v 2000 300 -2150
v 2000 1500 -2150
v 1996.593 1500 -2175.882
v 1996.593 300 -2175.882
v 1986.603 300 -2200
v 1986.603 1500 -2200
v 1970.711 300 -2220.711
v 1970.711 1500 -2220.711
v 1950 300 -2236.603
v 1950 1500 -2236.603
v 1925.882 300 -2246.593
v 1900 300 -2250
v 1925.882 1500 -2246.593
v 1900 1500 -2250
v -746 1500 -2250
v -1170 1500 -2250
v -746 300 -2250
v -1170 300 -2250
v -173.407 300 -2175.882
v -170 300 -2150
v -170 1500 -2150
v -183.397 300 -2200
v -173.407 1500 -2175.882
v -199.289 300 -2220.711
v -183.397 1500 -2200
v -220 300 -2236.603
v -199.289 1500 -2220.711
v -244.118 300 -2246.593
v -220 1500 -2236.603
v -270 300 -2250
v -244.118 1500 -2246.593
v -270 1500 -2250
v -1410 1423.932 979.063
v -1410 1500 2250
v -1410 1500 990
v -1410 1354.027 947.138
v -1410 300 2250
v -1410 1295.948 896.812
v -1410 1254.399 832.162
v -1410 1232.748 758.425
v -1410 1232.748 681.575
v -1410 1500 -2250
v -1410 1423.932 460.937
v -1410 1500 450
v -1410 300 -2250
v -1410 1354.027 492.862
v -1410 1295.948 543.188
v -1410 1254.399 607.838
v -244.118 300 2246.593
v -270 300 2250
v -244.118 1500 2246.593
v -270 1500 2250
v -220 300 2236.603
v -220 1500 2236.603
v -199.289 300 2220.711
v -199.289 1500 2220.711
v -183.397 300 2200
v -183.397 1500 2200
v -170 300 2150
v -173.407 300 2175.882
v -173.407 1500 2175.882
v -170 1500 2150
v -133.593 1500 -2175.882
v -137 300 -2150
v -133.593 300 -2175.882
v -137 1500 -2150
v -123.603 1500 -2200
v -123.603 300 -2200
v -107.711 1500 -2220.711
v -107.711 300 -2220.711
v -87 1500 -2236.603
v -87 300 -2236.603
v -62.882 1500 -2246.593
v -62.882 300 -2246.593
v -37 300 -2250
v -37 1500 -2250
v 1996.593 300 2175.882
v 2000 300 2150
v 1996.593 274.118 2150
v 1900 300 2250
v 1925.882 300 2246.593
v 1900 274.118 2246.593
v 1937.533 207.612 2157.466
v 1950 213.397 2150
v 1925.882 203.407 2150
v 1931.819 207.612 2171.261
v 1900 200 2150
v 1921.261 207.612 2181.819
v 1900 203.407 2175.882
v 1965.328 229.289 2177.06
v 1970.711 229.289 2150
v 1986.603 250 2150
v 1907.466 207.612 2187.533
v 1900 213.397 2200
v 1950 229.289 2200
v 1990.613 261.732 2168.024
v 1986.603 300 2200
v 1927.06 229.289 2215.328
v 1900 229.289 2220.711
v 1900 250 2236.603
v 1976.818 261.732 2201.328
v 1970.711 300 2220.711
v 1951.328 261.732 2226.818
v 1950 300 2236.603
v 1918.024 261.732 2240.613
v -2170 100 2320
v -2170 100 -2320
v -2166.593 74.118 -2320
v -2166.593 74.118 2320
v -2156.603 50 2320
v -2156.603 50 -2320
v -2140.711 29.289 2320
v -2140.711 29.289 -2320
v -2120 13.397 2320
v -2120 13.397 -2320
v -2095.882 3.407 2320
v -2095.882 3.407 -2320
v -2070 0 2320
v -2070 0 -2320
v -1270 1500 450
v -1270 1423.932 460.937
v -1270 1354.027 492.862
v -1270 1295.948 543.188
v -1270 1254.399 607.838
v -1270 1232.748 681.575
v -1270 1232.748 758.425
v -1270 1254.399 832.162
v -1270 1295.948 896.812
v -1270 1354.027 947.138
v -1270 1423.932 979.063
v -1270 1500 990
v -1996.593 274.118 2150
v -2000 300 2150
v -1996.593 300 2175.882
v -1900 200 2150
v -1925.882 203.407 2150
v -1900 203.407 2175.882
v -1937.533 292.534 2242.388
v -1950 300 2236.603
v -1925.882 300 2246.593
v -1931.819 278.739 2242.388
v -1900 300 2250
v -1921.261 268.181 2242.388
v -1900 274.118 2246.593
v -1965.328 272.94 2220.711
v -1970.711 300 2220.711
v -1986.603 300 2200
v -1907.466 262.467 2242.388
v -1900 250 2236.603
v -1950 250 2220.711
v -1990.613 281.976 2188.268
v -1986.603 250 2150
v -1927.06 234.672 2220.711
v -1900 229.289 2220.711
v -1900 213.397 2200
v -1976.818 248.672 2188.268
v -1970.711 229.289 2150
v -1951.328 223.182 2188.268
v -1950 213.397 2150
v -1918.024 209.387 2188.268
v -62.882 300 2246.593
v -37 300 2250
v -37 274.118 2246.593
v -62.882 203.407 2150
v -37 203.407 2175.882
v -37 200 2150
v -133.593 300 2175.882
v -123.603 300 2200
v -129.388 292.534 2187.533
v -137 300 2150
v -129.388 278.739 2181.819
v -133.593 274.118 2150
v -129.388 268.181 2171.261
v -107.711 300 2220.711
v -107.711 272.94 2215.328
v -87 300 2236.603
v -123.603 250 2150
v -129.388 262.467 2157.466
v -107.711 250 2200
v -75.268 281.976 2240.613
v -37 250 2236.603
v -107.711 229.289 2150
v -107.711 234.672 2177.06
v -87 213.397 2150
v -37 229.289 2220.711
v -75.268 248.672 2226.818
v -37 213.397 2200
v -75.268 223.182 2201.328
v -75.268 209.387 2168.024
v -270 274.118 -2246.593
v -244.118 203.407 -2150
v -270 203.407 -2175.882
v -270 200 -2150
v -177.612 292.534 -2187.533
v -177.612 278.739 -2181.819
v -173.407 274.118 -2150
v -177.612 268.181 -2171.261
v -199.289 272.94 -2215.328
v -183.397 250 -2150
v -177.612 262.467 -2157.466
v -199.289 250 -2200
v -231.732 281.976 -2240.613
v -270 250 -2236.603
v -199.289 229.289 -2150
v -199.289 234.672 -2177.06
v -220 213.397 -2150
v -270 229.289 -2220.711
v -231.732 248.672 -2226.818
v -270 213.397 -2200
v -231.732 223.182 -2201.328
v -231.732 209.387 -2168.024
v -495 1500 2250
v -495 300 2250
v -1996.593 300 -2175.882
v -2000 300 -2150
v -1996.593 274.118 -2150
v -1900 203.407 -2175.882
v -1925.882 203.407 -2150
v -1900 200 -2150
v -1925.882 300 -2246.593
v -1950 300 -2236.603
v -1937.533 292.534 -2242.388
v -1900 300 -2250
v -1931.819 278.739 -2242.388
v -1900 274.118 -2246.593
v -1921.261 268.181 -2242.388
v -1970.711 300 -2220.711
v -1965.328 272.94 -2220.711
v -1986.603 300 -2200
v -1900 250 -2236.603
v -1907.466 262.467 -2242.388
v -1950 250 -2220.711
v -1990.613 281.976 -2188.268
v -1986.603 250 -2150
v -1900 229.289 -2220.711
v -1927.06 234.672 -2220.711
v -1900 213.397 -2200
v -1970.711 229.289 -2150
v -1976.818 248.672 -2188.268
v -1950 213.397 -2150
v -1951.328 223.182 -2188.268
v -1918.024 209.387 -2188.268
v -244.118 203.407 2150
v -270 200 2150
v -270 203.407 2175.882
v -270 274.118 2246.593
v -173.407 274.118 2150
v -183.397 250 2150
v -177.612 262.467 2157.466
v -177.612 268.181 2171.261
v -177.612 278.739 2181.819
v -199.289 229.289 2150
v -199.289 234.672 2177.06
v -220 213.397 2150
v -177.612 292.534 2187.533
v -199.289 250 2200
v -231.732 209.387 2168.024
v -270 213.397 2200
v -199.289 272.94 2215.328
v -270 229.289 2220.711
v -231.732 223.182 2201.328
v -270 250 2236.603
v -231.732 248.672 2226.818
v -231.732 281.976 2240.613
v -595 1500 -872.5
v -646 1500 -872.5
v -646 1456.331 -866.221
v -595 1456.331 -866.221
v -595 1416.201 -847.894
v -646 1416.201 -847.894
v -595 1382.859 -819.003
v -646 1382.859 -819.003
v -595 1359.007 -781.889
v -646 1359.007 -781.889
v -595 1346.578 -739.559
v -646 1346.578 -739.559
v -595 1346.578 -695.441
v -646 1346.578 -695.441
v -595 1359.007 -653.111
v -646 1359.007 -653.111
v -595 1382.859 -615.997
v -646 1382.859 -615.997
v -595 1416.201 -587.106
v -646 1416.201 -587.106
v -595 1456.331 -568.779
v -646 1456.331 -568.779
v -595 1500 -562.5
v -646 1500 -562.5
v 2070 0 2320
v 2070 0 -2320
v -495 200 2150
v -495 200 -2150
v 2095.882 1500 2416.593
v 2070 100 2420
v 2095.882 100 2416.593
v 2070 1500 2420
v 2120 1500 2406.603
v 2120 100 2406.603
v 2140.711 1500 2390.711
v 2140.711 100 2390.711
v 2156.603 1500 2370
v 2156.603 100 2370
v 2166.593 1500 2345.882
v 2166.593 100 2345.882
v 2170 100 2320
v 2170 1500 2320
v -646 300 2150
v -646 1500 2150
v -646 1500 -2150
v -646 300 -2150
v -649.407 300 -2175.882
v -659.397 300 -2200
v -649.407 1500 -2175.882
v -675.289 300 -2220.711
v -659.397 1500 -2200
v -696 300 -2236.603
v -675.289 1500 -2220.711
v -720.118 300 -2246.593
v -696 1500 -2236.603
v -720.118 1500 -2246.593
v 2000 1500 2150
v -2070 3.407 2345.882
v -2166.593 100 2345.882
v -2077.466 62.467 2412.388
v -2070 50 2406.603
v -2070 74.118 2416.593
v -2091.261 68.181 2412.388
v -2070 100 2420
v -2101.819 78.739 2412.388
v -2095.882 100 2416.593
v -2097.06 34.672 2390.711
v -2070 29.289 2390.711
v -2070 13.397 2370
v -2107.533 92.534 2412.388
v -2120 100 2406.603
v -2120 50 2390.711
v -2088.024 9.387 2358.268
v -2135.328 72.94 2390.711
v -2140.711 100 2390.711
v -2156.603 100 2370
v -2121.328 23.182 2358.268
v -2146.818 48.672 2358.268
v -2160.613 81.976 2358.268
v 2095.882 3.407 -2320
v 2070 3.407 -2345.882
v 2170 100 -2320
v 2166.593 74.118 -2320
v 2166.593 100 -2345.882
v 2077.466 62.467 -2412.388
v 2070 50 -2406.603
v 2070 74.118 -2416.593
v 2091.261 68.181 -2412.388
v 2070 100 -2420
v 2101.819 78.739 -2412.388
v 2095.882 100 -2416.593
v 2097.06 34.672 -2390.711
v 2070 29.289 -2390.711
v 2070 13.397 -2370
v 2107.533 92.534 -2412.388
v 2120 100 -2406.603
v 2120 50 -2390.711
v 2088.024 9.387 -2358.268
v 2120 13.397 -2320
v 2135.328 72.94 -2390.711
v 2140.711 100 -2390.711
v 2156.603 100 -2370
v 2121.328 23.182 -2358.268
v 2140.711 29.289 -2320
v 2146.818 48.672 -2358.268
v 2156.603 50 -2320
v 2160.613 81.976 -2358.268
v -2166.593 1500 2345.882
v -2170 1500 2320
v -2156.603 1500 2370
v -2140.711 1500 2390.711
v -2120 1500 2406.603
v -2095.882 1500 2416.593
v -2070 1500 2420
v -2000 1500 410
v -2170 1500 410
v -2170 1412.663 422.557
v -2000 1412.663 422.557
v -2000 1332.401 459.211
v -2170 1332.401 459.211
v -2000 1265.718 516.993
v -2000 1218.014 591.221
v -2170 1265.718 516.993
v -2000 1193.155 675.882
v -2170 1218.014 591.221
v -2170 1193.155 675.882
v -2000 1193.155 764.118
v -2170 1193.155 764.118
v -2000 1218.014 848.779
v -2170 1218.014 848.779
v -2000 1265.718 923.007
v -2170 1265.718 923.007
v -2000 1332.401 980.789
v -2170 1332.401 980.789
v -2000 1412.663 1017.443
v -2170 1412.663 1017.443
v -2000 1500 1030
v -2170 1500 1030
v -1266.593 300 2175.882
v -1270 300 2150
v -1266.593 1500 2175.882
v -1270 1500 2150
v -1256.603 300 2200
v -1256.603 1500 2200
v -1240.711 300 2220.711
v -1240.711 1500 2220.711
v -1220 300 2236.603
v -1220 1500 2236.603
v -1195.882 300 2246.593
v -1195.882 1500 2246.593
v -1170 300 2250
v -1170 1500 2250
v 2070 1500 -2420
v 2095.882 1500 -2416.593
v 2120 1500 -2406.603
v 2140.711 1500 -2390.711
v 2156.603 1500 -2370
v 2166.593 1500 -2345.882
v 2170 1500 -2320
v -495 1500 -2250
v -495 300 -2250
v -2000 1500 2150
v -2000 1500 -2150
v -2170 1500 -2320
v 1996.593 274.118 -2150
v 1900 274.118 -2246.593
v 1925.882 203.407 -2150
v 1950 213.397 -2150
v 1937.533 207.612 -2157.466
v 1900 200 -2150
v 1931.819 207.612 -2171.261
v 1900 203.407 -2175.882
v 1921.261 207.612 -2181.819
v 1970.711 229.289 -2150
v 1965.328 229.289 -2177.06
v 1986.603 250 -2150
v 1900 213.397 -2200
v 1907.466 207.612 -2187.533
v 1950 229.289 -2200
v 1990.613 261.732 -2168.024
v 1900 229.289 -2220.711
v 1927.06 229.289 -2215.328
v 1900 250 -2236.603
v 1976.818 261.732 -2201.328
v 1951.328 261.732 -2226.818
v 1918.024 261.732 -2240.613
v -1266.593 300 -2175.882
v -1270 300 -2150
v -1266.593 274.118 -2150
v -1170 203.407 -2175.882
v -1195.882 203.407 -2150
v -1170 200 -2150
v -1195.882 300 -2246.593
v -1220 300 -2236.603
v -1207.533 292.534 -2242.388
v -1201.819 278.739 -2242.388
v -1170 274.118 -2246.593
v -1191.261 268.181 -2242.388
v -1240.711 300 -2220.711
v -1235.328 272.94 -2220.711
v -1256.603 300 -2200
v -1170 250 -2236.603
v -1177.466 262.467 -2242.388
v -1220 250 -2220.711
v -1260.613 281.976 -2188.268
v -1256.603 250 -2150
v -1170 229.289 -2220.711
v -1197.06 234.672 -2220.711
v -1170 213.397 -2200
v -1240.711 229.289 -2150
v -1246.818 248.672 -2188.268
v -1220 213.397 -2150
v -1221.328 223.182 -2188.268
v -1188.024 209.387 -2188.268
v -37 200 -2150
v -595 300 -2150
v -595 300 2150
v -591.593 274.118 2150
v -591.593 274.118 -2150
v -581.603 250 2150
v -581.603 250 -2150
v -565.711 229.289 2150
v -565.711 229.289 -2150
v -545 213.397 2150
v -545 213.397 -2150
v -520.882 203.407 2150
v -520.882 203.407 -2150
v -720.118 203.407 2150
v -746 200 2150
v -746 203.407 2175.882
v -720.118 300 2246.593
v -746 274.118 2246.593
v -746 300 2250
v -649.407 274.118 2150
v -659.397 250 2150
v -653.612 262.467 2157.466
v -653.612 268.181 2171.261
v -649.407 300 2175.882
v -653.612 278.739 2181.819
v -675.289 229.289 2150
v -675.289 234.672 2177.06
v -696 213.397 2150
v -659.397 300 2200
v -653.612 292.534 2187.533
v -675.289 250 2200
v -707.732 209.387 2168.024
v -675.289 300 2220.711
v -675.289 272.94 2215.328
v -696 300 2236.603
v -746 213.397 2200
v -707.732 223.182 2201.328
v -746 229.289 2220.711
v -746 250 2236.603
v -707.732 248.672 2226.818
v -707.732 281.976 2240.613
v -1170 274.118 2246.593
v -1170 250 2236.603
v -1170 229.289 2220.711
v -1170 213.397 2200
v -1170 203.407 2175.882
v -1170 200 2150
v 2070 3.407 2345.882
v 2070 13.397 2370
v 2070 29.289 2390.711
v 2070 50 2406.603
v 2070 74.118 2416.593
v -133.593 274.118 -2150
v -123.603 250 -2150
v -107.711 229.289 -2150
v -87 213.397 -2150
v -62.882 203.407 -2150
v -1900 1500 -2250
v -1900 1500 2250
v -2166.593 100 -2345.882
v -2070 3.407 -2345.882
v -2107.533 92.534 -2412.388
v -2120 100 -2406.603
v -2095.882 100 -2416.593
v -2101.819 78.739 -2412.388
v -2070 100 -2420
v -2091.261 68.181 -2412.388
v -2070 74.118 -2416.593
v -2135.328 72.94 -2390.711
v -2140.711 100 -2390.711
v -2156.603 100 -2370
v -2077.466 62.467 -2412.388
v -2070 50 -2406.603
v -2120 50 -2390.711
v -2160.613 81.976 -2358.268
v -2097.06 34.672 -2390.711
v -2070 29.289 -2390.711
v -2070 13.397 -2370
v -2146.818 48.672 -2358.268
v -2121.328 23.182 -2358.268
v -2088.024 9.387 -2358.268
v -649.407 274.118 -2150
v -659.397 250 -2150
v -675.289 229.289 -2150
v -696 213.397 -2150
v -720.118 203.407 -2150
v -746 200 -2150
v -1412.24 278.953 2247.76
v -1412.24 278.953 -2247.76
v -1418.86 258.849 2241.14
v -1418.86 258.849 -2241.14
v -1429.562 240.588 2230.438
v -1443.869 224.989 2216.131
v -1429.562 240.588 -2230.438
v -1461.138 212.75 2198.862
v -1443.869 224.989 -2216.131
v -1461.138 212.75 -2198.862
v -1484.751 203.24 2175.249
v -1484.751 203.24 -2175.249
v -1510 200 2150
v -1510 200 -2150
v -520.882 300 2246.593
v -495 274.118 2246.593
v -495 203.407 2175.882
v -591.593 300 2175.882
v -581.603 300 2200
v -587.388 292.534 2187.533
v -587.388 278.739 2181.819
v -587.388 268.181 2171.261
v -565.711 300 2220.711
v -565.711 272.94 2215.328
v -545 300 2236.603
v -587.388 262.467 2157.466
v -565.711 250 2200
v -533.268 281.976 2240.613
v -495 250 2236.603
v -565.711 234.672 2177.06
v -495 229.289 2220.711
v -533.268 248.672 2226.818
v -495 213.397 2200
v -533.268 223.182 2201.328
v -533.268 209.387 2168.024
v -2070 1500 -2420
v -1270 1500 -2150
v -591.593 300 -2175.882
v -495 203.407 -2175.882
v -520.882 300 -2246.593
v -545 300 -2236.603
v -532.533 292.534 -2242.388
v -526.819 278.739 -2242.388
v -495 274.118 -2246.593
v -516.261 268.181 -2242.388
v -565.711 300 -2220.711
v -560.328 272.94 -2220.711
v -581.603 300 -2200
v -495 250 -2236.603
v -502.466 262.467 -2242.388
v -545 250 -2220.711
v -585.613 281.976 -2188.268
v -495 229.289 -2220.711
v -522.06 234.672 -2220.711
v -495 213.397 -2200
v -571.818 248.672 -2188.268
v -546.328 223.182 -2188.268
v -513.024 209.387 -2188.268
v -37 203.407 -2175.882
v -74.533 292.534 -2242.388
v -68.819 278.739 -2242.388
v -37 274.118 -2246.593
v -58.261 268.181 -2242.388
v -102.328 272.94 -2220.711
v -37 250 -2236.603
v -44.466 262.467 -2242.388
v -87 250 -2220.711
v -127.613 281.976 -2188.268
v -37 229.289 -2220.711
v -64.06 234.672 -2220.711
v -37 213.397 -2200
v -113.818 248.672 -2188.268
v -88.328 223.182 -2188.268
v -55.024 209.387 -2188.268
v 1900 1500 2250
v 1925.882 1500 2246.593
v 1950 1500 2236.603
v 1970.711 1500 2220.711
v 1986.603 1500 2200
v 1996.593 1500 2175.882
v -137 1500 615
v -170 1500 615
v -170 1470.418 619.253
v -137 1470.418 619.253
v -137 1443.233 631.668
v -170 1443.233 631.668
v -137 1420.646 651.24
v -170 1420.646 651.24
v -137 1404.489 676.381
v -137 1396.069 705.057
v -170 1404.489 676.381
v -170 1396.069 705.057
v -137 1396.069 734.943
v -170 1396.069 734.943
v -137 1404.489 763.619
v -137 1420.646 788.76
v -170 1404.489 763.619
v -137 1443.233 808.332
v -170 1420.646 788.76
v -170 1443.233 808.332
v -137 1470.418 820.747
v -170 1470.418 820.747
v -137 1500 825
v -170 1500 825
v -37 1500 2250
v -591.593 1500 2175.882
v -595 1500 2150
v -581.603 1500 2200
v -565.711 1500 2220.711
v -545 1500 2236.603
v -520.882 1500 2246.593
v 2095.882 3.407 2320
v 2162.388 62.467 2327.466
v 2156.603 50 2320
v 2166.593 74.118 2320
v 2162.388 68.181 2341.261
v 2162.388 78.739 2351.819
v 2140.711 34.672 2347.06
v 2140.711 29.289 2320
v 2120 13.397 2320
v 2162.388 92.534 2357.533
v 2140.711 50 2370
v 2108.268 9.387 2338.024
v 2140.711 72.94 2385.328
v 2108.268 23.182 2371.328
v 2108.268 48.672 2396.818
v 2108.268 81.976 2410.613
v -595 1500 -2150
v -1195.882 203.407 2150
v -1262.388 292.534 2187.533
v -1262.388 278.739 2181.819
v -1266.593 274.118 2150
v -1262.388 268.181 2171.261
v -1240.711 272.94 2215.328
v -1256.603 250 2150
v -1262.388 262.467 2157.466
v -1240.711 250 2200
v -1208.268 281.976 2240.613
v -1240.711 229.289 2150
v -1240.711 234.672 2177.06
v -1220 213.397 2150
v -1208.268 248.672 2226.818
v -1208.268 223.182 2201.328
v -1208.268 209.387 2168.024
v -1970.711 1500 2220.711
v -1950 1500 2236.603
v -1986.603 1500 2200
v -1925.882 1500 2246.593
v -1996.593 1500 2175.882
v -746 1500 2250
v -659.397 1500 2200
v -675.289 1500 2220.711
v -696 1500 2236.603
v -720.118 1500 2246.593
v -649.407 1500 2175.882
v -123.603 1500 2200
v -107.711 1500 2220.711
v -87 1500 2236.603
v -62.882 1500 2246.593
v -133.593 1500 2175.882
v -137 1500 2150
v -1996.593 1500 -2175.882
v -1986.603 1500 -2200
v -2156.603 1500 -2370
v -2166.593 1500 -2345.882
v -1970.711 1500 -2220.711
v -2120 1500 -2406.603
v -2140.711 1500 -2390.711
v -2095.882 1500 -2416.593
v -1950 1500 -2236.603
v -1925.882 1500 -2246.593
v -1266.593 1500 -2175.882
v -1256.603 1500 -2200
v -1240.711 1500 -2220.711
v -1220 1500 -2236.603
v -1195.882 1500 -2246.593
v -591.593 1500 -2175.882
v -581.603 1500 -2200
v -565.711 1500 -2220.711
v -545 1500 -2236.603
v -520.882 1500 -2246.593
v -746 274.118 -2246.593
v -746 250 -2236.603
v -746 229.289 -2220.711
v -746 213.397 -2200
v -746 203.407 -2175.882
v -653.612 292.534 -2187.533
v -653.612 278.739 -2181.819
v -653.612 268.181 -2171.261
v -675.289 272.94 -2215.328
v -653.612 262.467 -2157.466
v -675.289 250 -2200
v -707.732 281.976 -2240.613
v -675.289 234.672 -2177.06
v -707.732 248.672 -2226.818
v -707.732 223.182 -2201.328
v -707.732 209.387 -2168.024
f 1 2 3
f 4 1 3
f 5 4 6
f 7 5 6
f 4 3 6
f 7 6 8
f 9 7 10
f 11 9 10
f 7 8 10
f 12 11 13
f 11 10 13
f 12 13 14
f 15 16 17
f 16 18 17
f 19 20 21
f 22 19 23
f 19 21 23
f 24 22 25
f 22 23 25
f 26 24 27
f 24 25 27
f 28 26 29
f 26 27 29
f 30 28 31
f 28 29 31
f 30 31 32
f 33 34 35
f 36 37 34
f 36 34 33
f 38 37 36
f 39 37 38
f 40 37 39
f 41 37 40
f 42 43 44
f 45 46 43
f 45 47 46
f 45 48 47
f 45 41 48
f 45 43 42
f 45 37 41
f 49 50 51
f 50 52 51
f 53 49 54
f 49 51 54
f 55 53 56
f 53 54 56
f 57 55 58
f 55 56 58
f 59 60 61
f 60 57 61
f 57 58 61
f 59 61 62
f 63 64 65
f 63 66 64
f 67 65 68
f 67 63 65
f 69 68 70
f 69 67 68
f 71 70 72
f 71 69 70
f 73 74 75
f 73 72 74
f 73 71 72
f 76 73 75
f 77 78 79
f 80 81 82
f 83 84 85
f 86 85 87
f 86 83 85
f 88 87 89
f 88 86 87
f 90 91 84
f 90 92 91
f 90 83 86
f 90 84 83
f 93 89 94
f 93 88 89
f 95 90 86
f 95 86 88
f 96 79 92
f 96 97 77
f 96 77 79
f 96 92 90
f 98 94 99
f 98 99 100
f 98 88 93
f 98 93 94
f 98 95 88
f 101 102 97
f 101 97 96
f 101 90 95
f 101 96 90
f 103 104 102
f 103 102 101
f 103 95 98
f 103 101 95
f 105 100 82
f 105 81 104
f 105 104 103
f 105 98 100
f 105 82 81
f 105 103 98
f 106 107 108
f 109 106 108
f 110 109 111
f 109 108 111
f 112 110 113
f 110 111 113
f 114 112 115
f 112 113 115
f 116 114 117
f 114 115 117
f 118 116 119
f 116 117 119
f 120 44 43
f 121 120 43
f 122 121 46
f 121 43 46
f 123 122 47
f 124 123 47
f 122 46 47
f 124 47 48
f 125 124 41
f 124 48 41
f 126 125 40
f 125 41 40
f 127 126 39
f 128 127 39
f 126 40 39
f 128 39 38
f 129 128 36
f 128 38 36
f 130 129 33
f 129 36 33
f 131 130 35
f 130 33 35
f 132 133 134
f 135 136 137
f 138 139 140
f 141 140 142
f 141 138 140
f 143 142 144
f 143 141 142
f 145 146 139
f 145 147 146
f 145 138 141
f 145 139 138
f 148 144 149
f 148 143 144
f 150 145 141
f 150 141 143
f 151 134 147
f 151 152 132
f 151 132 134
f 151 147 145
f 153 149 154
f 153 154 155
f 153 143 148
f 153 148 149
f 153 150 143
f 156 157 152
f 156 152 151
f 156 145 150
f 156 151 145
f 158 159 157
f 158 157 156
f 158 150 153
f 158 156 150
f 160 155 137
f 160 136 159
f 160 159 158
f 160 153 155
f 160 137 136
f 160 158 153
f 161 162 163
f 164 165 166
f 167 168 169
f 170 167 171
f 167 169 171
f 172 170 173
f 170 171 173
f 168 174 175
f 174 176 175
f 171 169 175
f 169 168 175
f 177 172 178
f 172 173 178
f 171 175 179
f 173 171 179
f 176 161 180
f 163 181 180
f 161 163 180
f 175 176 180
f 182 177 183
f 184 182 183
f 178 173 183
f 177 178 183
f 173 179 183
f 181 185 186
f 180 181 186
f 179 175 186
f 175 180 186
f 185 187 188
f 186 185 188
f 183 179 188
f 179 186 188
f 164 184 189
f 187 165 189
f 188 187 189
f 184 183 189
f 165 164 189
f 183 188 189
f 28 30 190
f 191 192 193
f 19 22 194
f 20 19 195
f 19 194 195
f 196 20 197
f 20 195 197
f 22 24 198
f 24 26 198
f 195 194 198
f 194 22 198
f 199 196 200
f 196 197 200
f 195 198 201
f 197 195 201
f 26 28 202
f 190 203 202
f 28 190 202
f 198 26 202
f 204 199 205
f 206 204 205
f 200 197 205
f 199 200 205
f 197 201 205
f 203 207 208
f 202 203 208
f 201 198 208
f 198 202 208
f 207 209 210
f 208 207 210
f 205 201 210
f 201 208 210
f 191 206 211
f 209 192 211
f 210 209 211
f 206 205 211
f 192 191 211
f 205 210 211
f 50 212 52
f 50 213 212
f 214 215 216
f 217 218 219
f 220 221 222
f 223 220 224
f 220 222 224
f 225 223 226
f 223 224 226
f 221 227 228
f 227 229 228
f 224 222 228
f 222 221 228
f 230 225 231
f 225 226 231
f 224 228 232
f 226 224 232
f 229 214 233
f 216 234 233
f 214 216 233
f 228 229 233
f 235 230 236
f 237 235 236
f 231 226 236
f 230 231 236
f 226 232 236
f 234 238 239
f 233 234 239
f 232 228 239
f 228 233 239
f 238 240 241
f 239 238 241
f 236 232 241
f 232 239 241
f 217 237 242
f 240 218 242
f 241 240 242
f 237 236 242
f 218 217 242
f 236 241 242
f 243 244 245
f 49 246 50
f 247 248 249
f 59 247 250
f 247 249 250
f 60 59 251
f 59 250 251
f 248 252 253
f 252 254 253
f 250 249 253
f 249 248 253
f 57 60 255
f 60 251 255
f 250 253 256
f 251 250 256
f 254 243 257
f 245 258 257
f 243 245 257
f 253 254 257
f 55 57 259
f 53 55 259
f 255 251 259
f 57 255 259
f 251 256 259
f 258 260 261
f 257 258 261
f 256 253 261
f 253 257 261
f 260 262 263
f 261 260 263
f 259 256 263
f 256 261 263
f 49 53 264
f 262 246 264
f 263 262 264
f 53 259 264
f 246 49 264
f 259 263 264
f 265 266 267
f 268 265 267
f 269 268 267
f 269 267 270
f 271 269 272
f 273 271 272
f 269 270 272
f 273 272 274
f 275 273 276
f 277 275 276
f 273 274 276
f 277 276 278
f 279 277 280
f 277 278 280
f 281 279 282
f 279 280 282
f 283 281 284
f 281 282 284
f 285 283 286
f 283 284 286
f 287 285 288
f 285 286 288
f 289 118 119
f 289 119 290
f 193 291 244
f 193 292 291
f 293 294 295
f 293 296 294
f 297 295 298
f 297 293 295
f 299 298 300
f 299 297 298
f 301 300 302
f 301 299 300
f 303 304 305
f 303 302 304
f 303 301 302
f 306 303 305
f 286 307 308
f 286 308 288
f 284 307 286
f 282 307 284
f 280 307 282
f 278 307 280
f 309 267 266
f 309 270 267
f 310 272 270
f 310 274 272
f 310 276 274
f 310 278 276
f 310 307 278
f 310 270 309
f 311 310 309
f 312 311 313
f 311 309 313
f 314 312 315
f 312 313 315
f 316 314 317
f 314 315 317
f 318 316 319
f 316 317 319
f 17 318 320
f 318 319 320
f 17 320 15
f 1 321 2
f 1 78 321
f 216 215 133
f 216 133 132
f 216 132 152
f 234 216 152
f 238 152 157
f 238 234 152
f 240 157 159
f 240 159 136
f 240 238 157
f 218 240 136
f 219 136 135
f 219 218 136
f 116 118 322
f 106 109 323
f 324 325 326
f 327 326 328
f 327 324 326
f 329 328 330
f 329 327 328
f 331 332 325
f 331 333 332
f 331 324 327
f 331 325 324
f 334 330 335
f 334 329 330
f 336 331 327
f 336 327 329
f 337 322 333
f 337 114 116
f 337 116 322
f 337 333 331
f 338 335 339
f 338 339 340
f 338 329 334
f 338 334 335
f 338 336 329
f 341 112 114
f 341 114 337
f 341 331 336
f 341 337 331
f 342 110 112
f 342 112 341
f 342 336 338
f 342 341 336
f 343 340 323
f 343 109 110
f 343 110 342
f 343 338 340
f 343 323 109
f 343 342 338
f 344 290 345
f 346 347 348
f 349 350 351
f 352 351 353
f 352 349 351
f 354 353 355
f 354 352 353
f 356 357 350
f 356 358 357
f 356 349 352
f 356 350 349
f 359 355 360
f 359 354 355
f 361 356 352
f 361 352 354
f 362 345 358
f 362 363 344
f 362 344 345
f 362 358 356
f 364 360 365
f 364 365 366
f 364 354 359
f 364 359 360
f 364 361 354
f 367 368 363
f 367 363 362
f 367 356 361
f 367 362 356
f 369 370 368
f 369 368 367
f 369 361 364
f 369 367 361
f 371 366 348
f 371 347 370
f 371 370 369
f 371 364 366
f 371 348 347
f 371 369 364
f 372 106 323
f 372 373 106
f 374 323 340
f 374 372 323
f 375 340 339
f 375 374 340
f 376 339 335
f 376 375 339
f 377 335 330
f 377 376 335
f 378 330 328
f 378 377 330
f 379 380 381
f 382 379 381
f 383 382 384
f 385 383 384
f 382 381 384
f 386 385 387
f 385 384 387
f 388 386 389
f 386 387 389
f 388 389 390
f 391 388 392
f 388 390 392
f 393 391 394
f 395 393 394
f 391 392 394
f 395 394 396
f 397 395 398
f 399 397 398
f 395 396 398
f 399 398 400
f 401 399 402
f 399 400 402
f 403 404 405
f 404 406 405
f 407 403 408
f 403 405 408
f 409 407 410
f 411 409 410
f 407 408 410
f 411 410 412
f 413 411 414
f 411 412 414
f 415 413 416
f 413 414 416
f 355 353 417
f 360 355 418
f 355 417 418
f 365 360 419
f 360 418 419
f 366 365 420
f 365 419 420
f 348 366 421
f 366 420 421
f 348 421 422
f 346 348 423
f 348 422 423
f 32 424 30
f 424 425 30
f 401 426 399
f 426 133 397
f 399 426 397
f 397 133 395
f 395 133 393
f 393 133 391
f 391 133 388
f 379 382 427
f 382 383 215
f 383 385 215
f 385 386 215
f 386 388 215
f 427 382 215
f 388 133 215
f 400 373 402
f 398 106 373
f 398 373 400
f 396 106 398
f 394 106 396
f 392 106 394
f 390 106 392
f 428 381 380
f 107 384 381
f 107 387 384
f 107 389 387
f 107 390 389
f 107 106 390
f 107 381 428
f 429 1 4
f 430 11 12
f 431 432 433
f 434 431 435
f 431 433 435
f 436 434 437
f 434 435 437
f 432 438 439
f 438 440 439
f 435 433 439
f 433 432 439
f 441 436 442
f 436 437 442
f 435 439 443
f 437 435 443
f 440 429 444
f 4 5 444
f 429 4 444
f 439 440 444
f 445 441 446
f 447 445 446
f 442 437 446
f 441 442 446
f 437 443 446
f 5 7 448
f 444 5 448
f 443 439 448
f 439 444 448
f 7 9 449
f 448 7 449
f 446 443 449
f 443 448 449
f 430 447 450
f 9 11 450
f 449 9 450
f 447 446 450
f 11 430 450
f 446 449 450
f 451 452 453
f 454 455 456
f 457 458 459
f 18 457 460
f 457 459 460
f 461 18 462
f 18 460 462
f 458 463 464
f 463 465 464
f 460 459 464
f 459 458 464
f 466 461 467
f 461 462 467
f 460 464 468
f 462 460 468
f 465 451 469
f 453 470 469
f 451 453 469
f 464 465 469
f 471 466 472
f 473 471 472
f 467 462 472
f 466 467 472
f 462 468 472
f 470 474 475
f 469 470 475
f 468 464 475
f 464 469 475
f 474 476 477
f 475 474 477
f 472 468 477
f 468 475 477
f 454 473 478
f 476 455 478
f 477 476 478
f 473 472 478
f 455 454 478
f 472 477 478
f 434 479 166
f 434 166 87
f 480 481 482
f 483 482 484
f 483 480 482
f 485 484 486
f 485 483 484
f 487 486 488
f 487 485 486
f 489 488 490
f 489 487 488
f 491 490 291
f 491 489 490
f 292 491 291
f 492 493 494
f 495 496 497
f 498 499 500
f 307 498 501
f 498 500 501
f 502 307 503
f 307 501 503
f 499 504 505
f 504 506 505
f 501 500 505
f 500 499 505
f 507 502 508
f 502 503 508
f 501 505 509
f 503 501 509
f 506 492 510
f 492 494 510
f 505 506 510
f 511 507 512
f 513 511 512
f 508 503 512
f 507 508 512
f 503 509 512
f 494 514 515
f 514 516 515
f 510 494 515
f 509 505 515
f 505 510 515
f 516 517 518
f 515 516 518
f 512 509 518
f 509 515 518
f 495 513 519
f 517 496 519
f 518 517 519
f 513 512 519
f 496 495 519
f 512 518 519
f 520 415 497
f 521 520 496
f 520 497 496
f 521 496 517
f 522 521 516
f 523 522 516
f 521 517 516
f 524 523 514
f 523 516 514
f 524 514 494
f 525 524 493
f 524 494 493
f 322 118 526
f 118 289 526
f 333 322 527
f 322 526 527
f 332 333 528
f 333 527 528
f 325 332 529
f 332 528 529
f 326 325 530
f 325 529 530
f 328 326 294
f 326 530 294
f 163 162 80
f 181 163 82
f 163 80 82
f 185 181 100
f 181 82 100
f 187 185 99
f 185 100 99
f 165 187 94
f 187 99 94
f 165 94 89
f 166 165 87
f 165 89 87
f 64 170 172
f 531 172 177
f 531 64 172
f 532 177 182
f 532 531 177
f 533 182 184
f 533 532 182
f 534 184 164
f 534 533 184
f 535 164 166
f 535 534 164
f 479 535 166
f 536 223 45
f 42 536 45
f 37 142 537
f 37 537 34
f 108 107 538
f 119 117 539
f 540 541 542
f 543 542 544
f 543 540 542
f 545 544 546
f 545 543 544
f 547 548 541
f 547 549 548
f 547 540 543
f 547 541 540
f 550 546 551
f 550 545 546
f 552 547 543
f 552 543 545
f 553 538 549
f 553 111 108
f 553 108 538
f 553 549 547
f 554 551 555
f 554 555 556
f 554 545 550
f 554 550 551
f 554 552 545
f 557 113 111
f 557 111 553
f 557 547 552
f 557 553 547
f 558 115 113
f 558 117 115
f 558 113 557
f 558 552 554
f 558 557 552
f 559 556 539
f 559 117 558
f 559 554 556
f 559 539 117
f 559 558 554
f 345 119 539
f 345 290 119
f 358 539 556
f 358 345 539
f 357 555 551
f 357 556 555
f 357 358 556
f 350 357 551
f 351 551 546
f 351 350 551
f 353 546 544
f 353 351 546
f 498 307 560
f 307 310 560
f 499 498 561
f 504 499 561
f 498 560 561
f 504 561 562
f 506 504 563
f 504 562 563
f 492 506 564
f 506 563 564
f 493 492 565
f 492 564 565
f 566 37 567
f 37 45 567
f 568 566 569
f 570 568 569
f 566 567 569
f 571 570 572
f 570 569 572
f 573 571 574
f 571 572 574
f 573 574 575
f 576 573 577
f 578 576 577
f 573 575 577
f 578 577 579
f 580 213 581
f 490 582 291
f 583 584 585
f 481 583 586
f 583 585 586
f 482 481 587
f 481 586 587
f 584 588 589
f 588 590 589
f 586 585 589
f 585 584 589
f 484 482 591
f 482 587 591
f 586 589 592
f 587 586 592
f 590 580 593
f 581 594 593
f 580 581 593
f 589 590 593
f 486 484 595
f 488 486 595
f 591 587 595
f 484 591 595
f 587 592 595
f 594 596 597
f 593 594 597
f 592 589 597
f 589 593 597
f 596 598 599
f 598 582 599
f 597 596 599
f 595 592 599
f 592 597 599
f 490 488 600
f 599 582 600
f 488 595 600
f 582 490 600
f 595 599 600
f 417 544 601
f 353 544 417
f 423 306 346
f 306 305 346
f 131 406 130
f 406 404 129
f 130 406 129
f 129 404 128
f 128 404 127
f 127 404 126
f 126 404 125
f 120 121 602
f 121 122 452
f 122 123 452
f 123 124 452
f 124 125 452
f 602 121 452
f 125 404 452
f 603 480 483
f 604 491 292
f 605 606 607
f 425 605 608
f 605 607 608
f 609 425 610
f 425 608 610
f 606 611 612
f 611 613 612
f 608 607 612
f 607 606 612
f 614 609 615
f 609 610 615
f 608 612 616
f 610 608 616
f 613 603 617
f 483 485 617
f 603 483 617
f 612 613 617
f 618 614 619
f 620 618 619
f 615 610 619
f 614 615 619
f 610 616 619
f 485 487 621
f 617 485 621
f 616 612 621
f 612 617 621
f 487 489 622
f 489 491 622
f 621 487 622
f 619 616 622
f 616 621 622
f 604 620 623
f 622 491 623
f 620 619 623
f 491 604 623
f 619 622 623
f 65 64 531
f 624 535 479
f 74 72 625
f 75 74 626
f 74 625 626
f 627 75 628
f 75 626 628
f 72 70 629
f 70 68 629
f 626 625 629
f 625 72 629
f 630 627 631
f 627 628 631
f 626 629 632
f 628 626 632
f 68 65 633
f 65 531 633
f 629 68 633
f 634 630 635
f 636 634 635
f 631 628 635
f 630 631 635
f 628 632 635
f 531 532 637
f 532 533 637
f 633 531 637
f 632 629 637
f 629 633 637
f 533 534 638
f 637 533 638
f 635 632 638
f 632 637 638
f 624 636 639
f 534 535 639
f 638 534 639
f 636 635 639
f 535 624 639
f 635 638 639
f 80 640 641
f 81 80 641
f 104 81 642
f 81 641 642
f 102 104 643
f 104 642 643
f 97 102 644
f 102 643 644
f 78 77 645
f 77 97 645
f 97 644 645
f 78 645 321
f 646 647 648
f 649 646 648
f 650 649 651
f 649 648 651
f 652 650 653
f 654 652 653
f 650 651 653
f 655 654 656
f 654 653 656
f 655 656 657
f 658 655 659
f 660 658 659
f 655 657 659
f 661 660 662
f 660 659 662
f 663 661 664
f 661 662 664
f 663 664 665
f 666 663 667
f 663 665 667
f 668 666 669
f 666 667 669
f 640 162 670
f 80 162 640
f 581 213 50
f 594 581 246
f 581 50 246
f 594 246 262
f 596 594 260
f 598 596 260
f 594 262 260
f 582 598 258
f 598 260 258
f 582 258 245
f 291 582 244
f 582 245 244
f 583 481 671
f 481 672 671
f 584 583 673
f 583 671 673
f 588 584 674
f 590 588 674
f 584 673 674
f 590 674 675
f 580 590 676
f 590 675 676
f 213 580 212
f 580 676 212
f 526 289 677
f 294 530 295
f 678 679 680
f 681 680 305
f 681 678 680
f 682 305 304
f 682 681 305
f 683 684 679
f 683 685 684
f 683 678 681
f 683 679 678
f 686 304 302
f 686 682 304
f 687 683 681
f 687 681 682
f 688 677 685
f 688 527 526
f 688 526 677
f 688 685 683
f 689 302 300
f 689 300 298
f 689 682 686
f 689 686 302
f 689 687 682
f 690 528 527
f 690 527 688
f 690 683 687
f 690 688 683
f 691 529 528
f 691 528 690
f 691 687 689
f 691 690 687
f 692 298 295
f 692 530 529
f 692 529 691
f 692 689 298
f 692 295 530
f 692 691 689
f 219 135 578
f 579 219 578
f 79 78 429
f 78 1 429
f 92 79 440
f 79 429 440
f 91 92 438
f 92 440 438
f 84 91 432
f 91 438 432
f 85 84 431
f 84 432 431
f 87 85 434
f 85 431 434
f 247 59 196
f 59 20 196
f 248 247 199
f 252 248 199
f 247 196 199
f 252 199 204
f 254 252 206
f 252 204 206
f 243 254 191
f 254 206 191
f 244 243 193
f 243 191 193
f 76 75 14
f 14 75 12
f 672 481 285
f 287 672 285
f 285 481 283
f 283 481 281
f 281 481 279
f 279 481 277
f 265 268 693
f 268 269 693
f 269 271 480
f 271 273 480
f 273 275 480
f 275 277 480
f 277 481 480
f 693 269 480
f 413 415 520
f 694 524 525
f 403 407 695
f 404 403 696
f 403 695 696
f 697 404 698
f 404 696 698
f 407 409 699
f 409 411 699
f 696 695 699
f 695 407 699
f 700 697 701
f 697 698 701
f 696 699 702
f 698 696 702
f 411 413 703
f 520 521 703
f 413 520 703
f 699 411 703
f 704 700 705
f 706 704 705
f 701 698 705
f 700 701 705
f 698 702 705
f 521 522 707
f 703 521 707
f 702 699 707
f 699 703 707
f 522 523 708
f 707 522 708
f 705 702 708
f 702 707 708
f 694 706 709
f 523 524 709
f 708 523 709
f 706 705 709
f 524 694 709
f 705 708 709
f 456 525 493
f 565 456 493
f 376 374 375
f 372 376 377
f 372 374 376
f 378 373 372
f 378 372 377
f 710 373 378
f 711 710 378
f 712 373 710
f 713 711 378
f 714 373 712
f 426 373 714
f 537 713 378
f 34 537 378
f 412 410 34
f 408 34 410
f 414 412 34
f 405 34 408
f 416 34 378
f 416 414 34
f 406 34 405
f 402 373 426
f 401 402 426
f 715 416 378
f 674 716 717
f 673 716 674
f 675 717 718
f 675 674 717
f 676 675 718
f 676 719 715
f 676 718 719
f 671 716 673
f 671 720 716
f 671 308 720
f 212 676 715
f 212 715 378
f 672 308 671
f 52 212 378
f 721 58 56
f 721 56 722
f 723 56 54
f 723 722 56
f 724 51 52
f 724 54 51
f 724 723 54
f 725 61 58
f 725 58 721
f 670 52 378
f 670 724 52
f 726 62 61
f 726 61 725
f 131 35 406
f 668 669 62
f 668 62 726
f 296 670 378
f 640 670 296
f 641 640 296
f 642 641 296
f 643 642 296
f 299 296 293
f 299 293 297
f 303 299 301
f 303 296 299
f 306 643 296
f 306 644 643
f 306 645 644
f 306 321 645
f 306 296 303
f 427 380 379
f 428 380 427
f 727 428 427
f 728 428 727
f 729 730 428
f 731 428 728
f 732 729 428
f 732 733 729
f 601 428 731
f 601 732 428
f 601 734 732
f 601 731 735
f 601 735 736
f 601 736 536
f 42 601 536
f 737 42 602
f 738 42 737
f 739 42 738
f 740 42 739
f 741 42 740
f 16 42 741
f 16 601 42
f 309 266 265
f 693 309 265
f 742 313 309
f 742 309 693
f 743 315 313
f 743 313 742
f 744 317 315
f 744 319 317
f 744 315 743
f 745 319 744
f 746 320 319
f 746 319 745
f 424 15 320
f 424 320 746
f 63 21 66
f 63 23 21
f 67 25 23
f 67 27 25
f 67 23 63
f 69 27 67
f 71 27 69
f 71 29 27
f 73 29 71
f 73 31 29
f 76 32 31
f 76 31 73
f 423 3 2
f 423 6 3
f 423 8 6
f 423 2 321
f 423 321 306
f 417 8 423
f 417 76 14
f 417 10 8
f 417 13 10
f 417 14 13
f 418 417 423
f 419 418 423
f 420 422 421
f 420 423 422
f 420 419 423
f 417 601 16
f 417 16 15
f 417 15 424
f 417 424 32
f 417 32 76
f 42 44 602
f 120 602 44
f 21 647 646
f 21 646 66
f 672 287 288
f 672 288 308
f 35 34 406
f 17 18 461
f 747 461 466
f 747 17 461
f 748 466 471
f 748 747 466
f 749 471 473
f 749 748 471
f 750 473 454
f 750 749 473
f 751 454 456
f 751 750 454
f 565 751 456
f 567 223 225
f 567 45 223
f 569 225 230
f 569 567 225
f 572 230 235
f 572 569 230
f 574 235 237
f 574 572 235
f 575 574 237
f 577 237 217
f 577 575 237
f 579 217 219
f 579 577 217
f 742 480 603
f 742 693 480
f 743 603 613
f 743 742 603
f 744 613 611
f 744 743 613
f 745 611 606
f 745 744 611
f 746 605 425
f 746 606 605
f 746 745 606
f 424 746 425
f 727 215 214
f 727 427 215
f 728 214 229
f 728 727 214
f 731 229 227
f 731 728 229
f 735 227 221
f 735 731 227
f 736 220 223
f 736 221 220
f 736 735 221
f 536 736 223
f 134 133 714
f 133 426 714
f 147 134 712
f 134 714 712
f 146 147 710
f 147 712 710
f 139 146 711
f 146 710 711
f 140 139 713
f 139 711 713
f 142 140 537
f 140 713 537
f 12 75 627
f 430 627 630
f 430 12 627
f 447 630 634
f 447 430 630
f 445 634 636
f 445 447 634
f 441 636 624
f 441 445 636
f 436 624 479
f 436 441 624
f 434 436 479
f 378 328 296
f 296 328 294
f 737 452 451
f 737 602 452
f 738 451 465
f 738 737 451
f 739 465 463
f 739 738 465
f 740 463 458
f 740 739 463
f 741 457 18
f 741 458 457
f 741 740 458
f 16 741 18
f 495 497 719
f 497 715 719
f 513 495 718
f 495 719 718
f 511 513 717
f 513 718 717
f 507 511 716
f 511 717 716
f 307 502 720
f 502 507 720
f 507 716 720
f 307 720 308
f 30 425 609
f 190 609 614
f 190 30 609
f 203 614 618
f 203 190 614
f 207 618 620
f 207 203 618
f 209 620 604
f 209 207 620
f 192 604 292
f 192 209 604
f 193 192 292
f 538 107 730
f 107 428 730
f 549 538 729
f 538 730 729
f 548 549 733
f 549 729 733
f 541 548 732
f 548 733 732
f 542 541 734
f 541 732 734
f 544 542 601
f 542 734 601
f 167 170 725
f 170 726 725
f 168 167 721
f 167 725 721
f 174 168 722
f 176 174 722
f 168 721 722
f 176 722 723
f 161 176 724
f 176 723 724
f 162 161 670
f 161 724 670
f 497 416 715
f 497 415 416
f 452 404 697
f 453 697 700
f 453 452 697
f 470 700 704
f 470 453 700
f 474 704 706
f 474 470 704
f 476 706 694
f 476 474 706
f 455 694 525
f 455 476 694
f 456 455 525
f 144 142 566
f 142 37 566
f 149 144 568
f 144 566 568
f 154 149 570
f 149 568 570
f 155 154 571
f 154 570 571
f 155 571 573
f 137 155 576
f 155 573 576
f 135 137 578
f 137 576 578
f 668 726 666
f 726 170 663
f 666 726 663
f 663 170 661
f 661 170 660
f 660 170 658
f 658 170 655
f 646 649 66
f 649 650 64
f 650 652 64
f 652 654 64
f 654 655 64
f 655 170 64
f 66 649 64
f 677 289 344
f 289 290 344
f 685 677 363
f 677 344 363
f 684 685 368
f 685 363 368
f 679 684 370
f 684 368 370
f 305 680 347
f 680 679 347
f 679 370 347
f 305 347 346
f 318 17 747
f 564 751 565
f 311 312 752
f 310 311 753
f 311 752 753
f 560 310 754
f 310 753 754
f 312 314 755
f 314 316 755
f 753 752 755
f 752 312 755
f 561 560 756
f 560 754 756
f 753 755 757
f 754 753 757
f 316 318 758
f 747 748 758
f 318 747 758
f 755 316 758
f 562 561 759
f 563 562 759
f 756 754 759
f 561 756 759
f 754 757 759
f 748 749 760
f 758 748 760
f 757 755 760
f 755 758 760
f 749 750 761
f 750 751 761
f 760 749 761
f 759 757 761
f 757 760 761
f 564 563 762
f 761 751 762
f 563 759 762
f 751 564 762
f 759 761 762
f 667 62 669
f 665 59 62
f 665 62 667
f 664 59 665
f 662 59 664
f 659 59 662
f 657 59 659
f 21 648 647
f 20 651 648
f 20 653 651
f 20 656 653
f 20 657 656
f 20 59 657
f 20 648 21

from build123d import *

# Parameters (mm, degrees)
SKETCH2_W           = 4000
SKETCH2_H           = 4500
BOSS_EXTRUDE1_DEPTH = 200
SKETCH5_W           = 4340
SKETCH5_H           = 4840
SKETCH5_W_2         = 4000
SKETCH5_H_2         = 4500
BOSS_EXTRUDE2_DEPTH = 1500
SKETCH6_W           = 140
SKETCH6_H           = 4500
SKETCH6_W_2         = 51
SKETCH6_W_3         = 33
BOSS_EXTRUDE4_DEPTH = 1300
CUT_EXTRUDE1_REACH  = 5192.568
SKETCH7_R           = 310
CUT_EXTRUDE2_REACH  = 4576.145
SKETCH8_R           = 270
CUT_EXTRUDE3_REACH  = 3687.377
SKETCH9_R           = 105
CUT_EXTRUDE4_REACH  = 4006.529
SKETCH10_R          = 155
FILLET1_R           = 100


with BuildPart() as part:
    # Sketch2 → Boss-Extrude1 (new body)
    with BuildSketch(Plane(origin=(0, 0, 0), x_dir=(1, 0, 0), z_dir=(0, 1, 0))):
        Rectangle(SKETCH2_W, SKETCH2_H)
    extrude(amount=BOSS_EXTRUDE1_DEPTH)

    # Sketch5 → Boss-Extrude2 (add)
    with BuildSketch(Plane(origin=(0, 0, 0), x_dir=(1, 0, 0), z_dir=(0, 1, 0))):
        Rectangle(SKETCH5_W, SKETCH5_H)
        Rectangle(SKETCH5_W_2, SKETCH5_H_2, mode=Mode.SUBTRACT)
    extrude(amount=BOSS_EXTRUDE2_DEPTH)

    # Sketch6 → Boss-Extrude4 (add)
    with BuildSketch(Plane(origin=(0, 200, 0), x_dir=(1, 0, 0), z_dir=(0, 1, 0))):
        with Locations((-1340, 0)):
            Rectangle(SKETCH6_W, SKETCH6_H)
        with Locations((-620.5, 0)):
            Rectangle(SKETCH6_W_2, SKETCH6_H)
        with Locations((-153.5, 0)):
            Rectangle(SKETCH6_W_3, SKETCH6_H)
    extrude(amount=BOSS_EXTRUDE4_DEPTH)

    # Sketch7 → Cut-Extrude1 (cut, up to next)
    with BuildSketch(Plane.ZY.offset(2170), mode=Mode.PRIVATE) as cut_extrude1_sk1:
        with Locations((720, 1500)):
            Circle(SKETCH7_R)
    cut_extrude1_tool1 = extrude(cut_extrude1_sk1.sketch, amount=-CUT_EXTRUDE1_REACH, mode=Mode.PRIVATE) & part.part
    add(cut_extrude1_tool1.solids().sort_by_distance((-2170, 1500, 720))[0], mode=Mode.SUBTRACT)

    # Sketch8 → Cut-Extrude2 (cut, up to next)
    with BuildSketch(Plane.ZY.offset(1410), mode=Mode.PRIVATE) as cut_extrude2_sk1:
        with Locations((720, 1500)):
            Circle(SKETCH8_R)
    cut_extrude2_tool1 = extrude(cut_extrude2_sk1.sketch, amount=-CUT_EXTRUDE2_REACH, mode=Mode.PRIVATE) & part.part
    add(cut_extrude2_tool1.solids().sort_by_distance((-1410, 1500, 720))[0], mode=Mode.SUBTRACT)

    # Sketch9 → Cut-Extrude3 (cut, up to next)
    with BuildSketch(Plane.ZY.offset(170), mode=Mode.PRIVATE) as cut_extrude3_sk1:
        with Locations((720, 1500)):
            Circle(SKETCH9_R)
    cut_extrude3_tool1 = extrude(cut_extrude3_sk1.sketch, amount=-CUT_EXTRUDE3_REACH, mode=Mode.PRIVATE) & part.part
    add(cut_extrude3_tool1.solids().sort_by_distance((-170, 1500, 720))[0], mode=Mode.SUBTRACT)

    # Sketch10 → Cut-Extrude4 (cut, up to next)
    with BuildSketch(Plane.ZY.offset(646), mode=Mode.PRIVATE) as cut_extrude4_sk1:
        with Locations((-717.5, 1500)):
            Circle(SKETCH10_R)
    cut_extrude4_tool1 = extrude(cut_extrude4_sk1.sketch, amount=-CUT_EXTRUDE4_REACH, mode=Mode.PRIVATE) & part.part
    add(cut_extrude4_tool1.solids().sort_by_distance((-646, 1500, -717.5))[0], mode=Mode.SUBTRACT)

    # Fillet1
    fillet1_edges = [part.edges().sort_by_distance(p)[0] for p in [
        (-2000, 200, 0),
        (2000, 850, -2250),
        (-2000, 850, -2250),
        (-2000, 850, 2250),
        (2000, 850, 2250),
        (-1705, 200, 2250),
        (-2170, 0, 0),
        (-2170, 750, -2420),
        (0, 0, 2420),
        (-2170, 750, 2420),
        (2170, 0, 0),
        (2170, 750, 2420),
        (0, 0, -2420),
        (2170, 750, -2420),
        (-958, 200, 2250),
        (-1705, 200, -2250),
        (-1410, 200, 0),
        (-1270, 850, 2250),
        (-1270, 200, 0),
        (-1270, 850, -2250),
        (2000, 200, 0),
        (-382.5, 200, 2250),
        (-958, 200, -2250),
        (-646, 850, -2250),
        (-646, 200, 0),
        (-646, 850, 2250),
        (-595, 850, 2250),
        (-595, 200, 0),
        (-595, 850, -2250),
        (931.5, 200, 2250),
        (-382.5, 200, -2250),
        (-170, 850, -2250),
        (-170, 200, 0),
        (-170, 850, 2250),
        (-137, 850, 2250),
        (-137, 200, 0),
        (-137, 850, -2250),
        (931.5, 200, -2250),
    ]]
    fillet(fillet1_edges, radius=FILLET1_R)


solid = part.part
